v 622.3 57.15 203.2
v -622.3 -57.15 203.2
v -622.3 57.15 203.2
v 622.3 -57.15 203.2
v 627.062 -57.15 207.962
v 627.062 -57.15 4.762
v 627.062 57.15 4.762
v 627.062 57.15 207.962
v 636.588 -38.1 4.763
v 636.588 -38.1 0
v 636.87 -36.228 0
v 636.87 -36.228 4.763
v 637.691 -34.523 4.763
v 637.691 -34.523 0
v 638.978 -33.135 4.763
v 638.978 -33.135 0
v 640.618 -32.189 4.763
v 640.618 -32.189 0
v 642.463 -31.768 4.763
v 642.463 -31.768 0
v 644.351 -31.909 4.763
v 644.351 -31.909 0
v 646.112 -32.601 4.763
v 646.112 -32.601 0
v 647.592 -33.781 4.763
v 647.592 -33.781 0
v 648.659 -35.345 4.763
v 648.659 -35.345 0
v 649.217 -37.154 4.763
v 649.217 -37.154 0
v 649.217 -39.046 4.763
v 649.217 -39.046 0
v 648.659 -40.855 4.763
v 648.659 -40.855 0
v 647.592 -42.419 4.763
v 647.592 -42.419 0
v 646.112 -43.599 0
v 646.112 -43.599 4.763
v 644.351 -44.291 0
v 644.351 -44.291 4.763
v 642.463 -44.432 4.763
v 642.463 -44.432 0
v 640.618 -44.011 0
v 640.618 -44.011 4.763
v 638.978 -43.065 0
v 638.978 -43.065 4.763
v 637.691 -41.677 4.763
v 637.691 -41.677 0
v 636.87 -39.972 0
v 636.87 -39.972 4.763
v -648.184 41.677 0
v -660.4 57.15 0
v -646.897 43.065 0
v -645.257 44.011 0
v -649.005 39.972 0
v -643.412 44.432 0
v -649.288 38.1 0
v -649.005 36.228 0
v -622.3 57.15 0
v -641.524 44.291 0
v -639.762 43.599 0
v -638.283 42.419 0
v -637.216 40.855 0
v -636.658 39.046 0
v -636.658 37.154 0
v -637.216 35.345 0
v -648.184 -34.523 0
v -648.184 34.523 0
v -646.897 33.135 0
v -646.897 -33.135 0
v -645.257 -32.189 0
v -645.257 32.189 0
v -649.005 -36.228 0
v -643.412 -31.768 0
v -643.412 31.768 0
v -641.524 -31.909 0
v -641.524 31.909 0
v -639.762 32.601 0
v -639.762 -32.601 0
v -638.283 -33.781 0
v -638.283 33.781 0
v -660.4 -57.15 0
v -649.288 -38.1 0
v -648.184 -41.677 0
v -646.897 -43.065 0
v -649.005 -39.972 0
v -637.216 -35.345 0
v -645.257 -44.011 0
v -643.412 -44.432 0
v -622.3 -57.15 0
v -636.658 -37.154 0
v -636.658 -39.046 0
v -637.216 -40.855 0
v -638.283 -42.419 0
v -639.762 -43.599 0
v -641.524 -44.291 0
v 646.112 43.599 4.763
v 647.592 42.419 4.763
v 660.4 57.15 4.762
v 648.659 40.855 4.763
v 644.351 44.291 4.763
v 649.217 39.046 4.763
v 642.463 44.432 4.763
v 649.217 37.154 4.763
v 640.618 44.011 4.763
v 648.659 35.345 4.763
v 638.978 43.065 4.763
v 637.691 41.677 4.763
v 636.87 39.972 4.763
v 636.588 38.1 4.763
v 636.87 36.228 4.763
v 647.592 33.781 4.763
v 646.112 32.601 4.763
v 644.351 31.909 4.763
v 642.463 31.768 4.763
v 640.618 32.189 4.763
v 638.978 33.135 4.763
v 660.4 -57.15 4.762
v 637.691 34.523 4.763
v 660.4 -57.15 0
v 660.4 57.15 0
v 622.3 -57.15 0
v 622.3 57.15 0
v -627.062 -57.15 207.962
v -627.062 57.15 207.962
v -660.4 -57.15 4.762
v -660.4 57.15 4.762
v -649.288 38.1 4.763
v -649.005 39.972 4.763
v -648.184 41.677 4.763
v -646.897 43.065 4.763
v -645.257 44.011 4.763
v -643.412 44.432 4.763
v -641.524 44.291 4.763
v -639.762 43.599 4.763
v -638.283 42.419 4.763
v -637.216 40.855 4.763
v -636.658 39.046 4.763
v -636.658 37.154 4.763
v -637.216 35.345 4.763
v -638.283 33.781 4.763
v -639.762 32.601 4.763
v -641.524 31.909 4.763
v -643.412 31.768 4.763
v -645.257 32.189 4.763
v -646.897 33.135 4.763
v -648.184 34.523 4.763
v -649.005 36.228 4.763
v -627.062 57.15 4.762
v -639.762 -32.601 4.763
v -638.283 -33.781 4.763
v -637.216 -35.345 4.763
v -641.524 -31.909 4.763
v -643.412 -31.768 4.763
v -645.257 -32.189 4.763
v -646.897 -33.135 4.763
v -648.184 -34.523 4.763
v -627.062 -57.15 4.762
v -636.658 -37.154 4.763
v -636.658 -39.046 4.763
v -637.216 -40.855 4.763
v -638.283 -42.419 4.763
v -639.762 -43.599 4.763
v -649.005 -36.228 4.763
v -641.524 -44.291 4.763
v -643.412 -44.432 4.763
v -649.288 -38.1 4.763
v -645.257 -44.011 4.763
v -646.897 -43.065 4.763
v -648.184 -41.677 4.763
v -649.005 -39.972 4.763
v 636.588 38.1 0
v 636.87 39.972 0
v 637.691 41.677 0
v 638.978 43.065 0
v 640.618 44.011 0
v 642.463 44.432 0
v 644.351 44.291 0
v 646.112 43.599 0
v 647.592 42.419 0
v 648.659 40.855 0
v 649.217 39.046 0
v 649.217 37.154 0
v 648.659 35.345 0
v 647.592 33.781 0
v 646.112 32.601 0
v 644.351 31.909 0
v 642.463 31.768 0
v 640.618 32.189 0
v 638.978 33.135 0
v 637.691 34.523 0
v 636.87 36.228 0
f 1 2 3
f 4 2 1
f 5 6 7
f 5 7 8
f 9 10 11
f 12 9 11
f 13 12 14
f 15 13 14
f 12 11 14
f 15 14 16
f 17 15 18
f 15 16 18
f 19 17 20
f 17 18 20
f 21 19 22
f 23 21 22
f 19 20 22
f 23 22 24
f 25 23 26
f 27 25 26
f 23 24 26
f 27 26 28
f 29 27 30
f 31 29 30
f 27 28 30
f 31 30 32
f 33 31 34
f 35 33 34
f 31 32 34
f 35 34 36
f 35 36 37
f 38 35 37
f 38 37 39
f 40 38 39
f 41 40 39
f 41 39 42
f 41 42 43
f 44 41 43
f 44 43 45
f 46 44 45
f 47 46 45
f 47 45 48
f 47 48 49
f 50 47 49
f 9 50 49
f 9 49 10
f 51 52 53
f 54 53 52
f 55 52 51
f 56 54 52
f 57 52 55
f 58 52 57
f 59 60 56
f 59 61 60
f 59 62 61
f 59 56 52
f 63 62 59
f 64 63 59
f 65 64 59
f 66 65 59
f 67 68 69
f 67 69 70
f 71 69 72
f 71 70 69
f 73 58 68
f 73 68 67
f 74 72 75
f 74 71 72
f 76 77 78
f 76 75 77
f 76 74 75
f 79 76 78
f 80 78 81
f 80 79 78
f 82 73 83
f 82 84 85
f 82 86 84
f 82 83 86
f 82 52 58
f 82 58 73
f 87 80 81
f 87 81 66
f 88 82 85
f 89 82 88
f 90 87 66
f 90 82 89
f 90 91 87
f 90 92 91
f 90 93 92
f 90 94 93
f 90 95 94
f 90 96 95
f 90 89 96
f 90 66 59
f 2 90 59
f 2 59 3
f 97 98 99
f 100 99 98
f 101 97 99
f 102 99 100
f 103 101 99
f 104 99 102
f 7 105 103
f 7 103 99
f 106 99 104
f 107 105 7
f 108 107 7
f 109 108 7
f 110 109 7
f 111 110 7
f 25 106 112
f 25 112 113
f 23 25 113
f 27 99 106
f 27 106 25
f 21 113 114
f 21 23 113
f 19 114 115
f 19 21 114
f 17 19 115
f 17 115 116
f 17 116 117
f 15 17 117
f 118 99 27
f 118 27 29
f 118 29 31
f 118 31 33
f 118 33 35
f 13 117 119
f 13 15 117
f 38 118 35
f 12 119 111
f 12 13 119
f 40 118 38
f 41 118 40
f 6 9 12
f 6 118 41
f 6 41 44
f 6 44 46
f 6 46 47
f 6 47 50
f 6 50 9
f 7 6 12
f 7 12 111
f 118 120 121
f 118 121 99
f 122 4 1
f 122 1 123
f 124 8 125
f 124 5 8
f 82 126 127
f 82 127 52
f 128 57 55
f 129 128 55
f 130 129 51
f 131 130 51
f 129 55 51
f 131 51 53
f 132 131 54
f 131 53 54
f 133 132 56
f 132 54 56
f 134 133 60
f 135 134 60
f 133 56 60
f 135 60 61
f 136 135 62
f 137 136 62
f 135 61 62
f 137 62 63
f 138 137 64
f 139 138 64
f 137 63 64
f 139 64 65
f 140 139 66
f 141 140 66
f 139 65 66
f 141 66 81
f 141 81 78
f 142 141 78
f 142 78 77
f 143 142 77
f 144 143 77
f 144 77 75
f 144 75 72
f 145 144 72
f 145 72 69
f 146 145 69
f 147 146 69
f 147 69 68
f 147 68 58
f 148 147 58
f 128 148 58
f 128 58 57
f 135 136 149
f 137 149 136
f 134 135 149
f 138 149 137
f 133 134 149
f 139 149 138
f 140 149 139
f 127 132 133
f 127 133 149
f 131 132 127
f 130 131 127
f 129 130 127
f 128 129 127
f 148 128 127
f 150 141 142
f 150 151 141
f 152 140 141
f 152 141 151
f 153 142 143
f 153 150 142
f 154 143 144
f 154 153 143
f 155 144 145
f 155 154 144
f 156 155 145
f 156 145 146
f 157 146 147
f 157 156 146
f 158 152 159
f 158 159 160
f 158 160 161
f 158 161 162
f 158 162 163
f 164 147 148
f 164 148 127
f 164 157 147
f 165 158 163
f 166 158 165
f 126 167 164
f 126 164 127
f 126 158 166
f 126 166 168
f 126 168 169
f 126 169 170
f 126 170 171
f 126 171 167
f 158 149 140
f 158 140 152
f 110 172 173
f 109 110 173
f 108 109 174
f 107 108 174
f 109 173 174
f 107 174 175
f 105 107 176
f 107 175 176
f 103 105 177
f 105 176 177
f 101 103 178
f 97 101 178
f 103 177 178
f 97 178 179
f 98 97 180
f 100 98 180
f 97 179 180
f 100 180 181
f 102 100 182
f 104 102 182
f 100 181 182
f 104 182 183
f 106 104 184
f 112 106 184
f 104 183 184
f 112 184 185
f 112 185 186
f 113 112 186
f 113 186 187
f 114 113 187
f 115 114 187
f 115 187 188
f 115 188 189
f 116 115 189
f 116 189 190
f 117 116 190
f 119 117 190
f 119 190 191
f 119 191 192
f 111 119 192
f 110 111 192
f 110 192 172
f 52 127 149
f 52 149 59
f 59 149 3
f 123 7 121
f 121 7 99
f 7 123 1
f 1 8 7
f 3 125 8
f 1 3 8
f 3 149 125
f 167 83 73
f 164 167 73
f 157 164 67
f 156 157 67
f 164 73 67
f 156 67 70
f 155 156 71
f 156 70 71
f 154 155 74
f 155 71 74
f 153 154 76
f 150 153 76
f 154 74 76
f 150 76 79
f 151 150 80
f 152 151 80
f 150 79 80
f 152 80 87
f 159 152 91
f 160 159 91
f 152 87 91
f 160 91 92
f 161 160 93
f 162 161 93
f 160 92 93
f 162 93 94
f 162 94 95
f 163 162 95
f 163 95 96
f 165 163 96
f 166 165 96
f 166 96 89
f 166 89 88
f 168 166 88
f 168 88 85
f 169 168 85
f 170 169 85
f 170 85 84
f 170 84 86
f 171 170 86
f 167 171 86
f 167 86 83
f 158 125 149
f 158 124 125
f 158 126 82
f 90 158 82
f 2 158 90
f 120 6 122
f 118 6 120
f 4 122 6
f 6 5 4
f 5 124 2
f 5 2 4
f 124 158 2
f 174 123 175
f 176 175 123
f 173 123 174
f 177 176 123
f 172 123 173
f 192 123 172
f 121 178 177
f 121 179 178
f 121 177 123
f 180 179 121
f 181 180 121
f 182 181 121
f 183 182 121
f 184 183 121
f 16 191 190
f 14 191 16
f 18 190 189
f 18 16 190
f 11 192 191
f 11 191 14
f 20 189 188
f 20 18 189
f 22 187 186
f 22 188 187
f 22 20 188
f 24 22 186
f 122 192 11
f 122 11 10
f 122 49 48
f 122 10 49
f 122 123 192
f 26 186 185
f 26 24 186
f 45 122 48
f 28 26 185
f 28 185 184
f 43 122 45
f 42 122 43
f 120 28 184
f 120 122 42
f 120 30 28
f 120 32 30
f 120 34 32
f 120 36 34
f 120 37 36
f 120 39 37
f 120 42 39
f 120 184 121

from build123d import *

# Parameters (mm, degrees)
F1_DEPTH = 57.15
F3_D     = 12.7


# Not quite as in the source:
# - a length typed as a fraction of an inch, garbled in the dataset ("3 / 203.2 mm" for 3/8 in), is restored


with BuildPart() as f1:
    # F0 (on Front) → F1 (new body, symmetric)
    with BuildSketch(Plane.XZ):
        Polygon((-627.0625, 4.7625), (-660.4, 4.7625), (-660.4, 0), (-622.3, 0), (-622.3, 203.2), (622.3, 203.2), (622.3, 0), (660.4, 0), (660.4, 4.7625), (627.0625, 4.7625), (627.0625, 207.9625), (-627.0625, 207.9625), align=None)
    extrude(amount=F1_DEPTH, both=True)

    # F3 (through all)
    with Locations(Plane.XY.offset(4.7625)):
        with Locations((-642.9375, 38.1), (-642.9375, -38.1), (642.9375, 38.1), (642.9375, -38.1)):
            Hole(F3_D / 2)


solid = f1.part
